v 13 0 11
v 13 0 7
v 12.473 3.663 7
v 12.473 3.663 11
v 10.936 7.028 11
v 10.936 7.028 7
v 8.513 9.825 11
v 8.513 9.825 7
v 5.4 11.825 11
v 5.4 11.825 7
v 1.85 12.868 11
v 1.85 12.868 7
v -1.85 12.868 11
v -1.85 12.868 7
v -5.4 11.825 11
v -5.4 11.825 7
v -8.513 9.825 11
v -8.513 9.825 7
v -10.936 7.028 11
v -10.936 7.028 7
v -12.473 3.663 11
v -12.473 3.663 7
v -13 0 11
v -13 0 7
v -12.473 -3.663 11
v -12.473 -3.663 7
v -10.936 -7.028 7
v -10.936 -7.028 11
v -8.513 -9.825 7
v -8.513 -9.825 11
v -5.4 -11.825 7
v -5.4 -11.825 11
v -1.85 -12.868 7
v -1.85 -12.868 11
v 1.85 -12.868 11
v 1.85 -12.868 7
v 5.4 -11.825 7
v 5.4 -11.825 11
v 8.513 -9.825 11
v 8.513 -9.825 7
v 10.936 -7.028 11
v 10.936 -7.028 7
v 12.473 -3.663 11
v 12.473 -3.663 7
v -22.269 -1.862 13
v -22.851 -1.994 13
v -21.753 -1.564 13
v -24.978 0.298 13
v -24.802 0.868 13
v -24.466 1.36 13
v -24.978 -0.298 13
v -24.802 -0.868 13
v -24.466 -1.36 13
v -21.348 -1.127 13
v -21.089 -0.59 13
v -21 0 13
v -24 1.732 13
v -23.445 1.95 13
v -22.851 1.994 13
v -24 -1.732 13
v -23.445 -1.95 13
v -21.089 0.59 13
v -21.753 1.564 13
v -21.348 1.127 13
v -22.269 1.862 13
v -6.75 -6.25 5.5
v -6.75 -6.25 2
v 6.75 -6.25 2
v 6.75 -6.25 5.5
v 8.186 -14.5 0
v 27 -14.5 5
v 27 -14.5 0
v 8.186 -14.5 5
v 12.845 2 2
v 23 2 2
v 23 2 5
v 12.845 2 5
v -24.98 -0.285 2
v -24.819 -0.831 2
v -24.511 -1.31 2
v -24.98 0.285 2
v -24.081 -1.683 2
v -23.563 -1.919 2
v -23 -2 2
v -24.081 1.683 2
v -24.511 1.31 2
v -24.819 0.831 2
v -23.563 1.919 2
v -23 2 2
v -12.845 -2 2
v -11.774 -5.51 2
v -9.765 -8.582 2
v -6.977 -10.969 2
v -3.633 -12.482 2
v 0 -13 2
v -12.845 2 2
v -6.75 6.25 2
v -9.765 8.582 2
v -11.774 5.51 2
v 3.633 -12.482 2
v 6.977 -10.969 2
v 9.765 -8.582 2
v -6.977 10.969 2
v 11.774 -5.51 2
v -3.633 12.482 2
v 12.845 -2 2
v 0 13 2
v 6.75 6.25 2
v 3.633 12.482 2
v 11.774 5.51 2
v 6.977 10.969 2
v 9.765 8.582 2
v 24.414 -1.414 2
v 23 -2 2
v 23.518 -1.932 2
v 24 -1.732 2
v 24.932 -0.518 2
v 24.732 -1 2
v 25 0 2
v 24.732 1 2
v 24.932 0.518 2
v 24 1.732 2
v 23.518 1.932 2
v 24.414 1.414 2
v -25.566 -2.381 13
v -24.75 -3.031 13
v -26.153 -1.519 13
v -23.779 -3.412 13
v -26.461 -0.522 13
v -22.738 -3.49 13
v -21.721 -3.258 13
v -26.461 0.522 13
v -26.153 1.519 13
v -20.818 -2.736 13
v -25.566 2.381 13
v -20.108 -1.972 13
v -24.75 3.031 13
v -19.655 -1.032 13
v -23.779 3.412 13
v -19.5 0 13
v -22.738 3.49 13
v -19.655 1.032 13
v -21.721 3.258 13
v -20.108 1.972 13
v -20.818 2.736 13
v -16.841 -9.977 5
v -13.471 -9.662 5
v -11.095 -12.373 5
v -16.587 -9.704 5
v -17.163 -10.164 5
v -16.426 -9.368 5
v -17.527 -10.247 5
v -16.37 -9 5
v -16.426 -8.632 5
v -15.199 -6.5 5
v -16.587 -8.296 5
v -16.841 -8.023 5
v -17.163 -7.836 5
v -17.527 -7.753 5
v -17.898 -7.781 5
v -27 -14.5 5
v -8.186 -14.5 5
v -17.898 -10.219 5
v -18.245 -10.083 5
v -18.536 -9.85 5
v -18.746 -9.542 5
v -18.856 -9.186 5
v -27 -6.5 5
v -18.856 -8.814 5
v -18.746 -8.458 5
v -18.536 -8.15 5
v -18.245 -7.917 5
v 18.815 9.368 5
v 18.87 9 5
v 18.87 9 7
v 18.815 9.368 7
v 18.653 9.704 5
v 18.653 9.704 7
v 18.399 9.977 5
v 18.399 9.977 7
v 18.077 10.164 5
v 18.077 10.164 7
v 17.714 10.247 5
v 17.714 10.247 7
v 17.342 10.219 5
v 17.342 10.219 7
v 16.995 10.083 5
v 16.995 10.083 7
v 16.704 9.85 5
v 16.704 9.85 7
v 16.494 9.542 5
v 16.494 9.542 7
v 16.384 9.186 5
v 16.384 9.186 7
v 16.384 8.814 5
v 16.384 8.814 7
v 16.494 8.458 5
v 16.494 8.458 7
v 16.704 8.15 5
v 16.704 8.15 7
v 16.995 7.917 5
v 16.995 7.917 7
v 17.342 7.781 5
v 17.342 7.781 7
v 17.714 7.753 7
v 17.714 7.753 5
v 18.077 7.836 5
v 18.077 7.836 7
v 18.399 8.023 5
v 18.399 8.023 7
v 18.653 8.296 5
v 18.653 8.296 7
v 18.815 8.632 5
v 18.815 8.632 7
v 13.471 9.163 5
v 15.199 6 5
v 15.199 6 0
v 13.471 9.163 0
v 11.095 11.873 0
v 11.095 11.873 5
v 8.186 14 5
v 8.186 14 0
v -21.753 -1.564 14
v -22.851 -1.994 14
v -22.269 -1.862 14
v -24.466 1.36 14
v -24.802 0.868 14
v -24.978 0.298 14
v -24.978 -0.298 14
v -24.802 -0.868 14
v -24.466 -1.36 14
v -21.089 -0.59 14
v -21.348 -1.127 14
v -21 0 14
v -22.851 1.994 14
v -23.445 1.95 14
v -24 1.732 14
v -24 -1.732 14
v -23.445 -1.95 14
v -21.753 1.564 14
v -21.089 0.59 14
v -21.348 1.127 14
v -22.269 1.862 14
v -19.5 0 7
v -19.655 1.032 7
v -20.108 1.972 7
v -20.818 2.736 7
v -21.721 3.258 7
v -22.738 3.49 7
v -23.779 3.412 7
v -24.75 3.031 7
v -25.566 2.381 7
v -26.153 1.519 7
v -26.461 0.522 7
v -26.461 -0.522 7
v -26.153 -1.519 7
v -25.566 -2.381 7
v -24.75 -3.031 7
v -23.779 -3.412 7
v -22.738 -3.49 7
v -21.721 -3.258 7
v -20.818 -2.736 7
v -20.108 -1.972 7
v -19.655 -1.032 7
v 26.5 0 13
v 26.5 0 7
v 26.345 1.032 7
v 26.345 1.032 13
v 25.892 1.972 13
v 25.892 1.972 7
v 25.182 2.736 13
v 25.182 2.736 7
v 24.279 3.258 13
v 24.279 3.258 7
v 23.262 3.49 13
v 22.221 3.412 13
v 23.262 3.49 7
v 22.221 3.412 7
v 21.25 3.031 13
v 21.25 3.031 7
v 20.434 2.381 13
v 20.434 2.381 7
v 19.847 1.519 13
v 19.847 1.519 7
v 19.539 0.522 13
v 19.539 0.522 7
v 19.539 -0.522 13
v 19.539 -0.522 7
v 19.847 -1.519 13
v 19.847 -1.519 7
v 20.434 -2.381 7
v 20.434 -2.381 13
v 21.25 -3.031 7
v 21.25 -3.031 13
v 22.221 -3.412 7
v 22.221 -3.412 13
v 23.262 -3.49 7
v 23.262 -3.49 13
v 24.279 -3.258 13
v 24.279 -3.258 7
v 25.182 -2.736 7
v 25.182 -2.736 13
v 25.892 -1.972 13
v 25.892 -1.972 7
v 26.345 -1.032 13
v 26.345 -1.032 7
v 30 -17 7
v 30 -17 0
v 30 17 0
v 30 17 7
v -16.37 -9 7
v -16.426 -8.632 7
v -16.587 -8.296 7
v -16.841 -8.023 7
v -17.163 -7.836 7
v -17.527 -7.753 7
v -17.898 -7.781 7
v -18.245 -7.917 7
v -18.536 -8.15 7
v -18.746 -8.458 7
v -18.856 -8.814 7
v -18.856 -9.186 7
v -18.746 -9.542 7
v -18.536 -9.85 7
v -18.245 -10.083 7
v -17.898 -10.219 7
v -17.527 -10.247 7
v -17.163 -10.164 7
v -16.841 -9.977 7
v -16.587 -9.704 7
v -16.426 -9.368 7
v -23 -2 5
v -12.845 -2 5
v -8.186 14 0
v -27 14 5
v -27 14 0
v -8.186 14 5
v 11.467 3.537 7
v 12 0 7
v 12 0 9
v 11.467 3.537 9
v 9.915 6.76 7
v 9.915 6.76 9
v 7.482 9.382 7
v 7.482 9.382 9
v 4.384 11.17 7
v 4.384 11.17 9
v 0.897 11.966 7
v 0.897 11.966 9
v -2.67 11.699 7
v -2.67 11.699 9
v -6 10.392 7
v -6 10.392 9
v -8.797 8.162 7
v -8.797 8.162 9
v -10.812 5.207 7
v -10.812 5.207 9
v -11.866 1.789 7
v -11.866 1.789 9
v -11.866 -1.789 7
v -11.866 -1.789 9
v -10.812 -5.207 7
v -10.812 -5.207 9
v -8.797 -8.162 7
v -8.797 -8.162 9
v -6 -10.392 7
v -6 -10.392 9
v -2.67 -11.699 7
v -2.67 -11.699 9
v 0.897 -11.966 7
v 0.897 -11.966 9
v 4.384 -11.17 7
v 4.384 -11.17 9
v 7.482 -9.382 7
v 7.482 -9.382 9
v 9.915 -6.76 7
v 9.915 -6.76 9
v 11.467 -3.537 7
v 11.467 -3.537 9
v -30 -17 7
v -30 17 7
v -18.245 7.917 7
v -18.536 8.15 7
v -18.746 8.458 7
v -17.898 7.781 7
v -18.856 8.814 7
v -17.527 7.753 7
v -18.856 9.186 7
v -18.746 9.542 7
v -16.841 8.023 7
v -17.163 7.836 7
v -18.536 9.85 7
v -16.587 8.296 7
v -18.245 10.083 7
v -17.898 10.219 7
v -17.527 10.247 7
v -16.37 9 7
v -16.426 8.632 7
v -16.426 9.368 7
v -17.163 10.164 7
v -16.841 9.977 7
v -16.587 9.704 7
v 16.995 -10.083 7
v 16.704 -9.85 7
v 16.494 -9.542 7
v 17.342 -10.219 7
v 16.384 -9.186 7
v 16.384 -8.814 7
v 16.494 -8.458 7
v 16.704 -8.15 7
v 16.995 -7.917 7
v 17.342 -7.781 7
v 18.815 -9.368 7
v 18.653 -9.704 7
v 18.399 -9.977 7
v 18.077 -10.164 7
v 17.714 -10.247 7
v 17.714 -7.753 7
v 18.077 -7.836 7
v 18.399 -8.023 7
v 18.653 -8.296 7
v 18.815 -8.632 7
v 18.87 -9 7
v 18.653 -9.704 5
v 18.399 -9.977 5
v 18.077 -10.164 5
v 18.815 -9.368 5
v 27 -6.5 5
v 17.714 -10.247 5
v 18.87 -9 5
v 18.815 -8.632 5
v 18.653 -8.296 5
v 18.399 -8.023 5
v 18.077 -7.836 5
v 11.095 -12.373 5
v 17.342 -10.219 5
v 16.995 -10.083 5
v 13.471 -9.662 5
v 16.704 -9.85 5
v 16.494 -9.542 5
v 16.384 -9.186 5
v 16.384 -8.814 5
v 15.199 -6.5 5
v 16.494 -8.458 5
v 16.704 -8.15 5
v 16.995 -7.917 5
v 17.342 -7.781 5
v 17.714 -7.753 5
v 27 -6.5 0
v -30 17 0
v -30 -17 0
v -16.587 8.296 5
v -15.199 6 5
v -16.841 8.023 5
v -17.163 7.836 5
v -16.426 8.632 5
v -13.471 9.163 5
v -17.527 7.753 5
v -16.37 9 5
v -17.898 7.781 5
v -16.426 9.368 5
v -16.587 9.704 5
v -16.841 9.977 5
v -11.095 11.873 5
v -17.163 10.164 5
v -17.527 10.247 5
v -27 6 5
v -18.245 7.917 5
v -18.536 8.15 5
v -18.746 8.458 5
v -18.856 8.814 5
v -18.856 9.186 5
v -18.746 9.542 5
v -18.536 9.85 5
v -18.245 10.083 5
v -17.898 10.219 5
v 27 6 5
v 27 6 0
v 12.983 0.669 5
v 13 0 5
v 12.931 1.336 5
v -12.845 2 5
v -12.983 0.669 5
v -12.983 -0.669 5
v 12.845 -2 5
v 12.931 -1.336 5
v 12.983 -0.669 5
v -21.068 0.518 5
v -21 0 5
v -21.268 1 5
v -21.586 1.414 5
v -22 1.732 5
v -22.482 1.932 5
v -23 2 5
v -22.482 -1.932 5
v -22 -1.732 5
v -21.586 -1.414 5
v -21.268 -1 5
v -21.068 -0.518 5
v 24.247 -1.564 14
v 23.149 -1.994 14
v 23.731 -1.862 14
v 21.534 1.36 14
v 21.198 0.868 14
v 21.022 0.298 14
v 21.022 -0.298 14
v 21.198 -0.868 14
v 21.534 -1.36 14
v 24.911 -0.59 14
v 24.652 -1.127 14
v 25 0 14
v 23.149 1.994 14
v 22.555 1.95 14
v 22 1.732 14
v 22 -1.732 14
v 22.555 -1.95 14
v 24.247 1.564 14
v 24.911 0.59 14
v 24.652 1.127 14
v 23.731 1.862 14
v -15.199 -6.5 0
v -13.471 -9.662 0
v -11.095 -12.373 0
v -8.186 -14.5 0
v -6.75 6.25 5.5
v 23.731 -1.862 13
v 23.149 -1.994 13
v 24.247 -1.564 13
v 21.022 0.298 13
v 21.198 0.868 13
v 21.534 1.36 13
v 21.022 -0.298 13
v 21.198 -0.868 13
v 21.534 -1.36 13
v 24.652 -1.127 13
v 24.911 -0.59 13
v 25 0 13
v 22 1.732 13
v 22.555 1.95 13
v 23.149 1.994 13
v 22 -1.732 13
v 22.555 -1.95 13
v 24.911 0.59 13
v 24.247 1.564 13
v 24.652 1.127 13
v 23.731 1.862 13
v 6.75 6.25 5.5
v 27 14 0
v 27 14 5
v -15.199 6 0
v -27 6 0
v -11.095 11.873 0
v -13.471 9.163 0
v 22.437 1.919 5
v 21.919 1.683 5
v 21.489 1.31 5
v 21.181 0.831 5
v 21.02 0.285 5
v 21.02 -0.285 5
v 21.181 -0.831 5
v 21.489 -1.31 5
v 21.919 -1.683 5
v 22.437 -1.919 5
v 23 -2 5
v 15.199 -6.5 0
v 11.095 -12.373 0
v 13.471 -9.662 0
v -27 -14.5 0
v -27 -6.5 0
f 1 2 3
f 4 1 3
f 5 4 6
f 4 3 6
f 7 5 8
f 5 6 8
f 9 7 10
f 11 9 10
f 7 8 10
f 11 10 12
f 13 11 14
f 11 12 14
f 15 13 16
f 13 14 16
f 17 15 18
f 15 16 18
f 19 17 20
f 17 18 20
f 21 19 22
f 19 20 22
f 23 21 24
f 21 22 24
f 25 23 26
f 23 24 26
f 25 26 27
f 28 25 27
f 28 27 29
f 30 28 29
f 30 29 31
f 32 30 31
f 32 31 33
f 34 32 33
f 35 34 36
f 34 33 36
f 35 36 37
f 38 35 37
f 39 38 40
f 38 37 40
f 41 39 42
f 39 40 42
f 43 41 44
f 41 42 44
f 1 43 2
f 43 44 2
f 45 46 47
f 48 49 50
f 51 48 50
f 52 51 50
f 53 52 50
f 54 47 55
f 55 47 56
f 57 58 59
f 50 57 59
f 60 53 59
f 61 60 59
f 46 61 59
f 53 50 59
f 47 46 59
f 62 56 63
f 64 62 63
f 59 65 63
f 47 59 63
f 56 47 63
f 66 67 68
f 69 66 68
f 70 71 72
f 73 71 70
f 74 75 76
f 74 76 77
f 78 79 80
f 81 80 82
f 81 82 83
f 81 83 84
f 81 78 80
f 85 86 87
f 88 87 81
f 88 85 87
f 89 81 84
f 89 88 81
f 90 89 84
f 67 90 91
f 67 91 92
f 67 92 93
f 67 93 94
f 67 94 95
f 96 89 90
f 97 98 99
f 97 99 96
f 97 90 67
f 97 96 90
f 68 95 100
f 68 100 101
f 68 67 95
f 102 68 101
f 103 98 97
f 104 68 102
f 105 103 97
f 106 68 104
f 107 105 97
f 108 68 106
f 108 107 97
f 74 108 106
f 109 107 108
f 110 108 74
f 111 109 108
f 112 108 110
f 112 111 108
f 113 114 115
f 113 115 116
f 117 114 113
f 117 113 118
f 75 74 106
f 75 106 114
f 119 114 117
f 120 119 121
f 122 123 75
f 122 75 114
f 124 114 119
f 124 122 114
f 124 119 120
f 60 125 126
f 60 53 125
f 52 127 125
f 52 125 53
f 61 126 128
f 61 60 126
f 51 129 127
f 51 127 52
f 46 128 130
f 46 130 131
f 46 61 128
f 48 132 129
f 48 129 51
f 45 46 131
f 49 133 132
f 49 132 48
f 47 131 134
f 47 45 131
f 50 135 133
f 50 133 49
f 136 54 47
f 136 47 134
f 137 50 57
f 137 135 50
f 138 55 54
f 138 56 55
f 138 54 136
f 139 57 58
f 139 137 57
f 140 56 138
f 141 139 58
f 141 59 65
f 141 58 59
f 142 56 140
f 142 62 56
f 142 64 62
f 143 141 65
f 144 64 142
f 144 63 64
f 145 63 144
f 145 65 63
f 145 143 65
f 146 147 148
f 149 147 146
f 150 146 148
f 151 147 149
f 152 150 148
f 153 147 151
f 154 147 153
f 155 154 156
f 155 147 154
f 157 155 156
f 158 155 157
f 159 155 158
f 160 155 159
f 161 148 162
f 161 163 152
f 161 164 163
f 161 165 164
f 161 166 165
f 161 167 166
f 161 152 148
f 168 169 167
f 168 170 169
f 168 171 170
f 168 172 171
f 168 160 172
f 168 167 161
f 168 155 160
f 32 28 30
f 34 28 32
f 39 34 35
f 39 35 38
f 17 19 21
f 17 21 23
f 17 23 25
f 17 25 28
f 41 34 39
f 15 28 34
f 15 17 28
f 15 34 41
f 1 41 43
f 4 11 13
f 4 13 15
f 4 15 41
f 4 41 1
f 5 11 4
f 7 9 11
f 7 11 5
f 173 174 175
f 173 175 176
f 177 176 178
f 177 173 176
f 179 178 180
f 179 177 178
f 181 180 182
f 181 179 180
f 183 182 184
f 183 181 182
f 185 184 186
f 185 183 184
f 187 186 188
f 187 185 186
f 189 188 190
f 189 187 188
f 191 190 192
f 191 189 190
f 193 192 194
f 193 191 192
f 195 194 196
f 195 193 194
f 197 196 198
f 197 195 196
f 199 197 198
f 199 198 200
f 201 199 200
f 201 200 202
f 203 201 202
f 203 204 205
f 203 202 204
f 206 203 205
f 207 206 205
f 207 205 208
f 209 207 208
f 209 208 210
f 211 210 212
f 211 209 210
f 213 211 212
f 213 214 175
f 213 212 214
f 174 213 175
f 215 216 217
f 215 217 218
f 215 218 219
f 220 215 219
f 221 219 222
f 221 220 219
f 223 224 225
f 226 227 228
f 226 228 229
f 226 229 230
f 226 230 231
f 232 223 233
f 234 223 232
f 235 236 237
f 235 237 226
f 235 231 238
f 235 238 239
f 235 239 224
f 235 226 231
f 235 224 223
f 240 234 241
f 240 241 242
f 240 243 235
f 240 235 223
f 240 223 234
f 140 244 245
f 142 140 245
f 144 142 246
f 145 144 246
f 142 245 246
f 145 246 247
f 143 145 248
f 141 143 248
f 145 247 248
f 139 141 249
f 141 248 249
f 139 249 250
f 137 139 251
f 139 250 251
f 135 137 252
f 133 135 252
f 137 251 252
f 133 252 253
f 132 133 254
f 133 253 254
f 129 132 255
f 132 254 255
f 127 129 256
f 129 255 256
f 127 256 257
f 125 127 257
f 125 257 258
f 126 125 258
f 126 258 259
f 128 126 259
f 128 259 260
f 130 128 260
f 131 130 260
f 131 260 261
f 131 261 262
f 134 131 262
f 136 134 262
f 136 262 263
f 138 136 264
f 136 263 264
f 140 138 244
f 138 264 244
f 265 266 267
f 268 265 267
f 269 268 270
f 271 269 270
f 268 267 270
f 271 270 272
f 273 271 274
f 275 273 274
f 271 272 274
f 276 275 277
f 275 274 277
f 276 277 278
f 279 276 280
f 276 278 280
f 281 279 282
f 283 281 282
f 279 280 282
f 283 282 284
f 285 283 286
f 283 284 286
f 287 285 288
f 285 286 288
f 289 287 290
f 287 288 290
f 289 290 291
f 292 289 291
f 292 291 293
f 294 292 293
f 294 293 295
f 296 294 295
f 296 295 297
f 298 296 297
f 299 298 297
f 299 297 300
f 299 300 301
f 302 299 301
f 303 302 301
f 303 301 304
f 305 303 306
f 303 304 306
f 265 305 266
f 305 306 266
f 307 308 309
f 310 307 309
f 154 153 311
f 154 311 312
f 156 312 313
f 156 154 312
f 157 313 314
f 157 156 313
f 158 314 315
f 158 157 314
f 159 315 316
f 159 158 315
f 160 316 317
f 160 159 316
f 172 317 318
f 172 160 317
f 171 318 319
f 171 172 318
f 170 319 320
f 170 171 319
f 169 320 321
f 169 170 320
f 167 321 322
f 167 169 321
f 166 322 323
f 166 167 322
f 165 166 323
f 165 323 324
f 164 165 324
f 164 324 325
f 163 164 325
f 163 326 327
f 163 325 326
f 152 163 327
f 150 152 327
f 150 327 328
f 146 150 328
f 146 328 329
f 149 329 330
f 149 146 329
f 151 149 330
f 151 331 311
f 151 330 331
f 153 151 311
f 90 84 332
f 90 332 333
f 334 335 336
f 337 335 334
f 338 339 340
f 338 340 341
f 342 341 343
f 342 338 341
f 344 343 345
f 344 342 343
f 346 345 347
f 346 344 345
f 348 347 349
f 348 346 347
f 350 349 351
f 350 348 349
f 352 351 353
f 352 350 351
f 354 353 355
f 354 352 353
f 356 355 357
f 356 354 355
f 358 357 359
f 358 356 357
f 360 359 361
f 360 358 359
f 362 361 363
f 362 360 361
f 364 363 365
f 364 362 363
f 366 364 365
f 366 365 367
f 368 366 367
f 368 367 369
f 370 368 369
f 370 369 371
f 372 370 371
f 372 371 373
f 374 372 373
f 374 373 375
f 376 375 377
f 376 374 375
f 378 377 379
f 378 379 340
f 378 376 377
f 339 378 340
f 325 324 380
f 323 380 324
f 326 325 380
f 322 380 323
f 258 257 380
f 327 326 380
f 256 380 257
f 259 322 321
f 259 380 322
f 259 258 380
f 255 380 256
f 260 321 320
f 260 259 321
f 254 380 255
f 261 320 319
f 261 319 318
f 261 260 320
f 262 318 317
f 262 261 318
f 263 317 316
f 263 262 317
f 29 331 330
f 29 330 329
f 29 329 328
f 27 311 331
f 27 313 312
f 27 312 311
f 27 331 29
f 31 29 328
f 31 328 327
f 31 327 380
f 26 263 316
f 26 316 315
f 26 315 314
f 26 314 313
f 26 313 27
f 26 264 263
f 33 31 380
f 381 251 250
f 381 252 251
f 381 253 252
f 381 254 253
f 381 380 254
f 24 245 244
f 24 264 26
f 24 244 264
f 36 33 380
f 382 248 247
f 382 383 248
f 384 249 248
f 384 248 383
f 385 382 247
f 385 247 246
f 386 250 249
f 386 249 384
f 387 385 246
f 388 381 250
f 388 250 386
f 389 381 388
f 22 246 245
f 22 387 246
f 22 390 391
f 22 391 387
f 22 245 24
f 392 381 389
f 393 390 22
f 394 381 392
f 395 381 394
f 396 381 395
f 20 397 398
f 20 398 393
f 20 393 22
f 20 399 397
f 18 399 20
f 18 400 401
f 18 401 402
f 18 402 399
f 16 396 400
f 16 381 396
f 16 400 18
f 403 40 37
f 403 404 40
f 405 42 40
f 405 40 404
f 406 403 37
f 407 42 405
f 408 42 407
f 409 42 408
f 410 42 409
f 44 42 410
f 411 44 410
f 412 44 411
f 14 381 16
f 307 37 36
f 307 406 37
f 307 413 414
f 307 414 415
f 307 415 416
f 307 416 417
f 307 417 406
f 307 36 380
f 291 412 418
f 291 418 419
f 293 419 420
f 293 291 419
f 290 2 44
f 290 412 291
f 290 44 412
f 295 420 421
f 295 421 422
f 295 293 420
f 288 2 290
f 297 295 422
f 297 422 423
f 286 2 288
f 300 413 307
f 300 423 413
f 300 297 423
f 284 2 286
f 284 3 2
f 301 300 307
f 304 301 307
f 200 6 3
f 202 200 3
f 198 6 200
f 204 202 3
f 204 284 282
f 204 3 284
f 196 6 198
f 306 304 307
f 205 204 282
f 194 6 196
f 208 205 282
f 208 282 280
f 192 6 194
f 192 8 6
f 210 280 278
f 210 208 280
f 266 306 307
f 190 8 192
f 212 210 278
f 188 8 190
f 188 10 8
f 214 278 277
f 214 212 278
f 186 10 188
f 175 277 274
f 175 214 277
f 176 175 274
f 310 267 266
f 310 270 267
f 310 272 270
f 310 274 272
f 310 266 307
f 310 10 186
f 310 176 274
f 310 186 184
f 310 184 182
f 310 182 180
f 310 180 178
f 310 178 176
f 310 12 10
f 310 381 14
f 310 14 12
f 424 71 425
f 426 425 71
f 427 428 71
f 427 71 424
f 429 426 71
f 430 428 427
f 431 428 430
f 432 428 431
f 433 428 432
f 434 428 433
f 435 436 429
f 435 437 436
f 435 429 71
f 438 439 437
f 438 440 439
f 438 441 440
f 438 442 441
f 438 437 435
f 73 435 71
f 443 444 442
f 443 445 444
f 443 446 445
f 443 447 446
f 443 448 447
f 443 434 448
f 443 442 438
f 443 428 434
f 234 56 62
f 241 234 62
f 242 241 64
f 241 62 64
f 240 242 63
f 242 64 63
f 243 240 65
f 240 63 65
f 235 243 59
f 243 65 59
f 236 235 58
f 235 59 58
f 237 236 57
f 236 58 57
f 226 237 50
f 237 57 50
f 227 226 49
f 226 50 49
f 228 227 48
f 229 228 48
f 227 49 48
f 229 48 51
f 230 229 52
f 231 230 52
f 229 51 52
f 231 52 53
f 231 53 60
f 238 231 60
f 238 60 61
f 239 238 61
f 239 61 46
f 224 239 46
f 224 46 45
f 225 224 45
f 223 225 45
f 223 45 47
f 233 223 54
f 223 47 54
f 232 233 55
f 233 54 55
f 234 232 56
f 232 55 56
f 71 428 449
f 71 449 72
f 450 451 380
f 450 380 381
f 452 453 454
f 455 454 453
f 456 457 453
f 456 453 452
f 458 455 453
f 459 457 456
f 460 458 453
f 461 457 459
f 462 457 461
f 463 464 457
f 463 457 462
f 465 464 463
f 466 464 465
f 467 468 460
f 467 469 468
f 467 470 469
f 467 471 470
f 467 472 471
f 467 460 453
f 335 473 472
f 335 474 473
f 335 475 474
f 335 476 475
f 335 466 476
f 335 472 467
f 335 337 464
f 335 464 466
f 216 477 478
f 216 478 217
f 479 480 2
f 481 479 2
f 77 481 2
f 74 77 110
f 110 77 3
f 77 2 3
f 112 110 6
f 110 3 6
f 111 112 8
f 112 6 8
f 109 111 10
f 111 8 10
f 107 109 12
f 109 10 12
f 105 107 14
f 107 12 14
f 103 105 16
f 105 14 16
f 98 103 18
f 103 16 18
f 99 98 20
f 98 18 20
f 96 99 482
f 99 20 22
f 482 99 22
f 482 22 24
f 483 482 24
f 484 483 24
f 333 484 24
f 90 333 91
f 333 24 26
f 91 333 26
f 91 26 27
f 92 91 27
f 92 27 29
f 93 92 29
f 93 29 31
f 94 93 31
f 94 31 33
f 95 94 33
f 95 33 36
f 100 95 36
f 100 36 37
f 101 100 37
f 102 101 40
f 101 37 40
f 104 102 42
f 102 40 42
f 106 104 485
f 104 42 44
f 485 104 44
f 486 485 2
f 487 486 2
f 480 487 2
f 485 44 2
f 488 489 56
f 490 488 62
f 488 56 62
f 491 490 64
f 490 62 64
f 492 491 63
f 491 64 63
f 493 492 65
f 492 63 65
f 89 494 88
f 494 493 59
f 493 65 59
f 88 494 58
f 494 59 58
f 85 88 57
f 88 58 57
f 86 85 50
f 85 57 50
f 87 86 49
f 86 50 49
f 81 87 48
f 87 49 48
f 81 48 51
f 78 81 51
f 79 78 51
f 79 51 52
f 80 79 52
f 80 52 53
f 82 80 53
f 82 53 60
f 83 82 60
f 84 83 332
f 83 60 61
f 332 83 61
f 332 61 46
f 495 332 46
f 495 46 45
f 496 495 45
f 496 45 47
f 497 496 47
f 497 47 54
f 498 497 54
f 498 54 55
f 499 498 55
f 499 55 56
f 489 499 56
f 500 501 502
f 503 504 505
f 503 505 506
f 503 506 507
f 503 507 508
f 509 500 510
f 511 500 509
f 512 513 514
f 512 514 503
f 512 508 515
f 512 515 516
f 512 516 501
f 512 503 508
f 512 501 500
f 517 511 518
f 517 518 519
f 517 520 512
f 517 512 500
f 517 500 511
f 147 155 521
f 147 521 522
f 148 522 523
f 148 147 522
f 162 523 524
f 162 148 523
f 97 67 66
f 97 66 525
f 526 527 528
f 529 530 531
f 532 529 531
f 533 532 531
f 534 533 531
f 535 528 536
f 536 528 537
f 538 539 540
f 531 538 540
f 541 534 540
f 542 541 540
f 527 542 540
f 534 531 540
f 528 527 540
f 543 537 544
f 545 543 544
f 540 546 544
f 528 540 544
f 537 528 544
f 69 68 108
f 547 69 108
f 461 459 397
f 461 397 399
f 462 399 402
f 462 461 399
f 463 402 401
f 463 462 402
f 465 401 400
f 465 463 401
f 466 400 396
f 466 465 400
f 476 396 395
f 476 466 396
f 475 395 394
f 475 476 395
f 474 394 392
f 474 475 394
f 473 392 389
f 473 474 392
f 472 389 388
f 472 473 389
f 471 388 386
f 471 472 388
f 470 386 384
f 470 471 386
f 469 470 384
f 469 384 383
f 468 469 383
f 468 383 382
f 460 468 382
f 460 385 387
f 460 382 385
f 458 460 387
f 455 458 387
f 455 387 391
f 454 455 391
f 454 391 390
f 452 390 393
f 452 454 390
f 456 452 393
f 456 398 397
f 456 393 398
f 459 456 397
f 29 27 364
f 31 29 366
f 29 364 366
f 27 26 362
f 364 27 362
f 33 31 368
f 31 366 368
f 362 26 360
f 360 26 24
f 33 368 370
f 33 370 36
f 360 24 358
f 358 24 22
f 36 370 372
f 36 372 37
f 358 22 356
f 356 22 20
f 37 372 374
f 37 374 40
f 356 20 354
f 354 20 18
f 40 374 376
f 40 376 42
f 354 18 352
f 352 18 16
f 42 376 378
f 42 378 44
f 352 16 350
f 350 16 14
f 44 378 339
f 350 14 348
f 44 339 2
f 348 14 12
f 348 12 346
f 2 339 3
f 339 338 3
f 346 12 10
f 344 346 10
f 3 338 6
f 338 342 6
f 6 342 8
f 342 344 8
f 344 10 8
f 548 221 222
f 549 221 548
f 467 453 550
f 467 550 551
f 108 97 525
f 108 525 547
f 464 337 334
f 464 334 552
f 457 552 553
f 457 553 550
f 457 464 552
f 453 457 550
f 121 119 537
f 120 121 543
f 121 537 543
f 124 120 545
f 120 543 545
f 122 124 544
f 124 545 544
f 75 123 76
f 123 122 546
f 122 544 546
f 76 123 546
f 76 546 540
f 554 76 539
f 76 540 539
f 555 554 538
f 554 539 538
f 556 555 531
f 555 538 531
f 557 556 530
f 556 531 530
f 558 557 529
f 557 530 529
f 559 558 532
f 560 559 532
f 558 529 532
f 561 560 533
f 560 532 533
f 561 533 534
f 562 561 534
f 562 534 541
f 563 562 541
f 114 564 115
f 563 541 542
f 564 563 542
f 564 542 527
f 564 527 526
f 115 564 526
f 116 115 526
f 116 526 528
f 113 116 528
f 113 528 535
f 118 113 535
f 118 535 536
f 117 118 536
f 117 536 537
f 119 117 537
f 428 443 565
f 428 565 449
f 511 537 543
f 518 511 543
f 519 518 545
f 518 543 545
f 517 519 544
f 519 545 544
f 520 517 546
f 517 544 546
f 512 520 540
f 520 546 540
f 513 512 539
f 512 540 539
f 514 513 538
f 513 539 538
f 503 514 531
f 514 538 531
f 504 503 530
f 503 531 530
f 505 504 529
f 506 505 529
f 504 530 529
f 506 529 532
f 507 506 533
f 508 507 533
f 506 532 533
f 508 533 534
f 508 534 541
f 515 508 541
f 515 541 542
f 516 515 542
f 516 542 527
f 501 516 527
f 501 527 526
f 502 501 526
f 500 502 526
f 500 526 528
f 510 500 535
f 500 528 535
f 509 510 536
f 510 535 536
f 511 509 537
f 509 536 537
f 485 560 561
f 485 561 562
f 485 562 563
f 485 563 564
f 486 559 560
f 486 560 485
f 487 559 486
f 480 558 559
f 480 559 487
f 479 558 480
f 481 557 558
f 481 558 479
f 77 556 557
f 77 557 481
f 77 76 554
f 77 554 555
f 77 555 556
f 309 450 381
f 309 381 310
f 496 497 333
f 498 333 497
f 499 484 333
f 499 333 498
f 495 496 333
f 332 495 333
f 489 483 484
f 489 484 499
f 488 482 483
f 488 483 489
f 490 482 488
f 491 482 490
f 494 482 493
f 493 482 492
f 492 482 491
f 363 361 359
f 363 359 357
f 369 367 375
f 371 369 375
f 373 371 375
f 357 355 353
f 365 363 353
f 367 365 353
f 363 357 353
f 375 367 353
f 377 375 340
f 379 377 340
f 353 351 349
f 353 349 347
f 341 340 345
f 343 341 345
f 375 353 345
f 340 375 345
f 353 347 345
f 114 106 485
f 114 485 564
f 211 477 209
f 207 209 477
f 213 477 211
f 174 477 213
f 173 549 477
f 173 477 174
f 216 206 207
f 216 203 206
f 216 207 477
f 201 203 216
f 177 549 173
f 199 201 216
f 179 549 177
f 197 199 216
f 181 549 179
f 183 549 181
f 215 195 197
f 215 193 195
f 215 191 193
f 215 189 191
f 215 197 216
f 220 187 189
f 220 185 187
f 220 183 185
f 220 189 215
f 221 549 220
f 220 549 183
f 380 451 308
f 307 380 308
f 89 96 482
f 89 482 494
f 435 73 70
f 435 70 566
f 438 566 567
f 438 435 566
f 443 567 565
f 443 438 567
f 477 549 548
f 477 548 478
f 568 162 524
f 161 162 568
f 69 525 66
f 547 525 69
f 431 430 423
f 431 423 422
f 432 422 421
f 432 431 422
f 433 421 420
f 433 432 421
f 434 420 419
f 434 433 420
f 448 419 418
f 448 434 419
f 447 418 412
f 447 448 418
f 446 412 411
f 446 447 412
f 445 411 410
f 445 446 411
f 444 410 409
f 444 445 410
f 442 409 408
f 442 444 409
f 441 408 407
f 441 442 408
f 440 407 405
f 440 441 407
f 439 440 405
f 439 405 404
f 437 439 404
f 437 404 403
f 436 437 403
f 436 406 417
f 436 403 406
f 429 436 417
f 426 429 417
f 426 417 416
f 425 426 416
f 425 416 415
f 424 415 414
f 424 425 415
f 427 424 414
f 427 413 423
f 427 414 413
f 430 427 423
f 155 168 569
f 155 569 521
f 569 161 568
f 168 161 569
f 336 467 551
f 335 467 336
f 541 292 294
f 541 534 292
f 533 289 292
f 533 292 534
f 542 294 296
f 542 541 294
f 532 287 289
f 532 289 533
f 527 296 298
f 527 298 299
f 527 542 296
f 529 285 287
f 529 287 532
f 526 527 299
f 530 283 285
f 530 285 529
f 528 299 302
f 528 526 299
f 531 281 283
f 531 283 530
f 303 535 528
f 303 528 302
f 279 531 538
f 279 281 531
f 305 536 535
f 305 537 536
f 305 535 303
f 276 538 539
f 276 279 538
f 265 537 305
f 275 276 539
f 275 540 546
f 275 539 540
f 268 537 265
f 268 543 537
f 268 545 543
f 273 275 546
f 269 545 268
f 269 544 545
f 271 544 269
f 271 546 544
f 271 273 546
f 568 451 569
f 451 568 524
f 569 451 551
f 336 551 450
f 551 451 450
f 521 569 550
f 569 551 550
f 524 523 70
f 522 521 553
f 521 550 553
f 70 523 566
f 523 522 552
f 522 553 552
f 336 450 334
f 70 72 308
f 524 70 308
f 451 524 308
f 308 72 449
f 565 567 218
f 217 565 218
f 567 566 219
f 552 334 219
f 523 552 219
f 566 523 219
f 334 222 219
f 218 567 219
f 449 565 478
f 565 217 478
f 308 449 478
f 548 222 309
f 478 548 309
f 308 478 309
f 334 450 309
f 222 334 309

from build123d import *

# Parameters (mm, degrees)
SKETCH1_W                = 60
SKETCH1_H                = 34
BOSS_EXTRUDE1_DEPTH      = 7
SKETCH6_R                = 2
SKETCH6_R_2              = 13
CUT_EXTRUDE4_DEPTH       = 5
CUT_EXTRUDE6_DEPTH       = 3
SKETCH10_R               = 3.5
BOSS_EXTRUDE5_DEPTH      = 6
SKETCH11_R               = 2
CUT_EXTRUDE7_DEPTH       = 7
CUT_EXTRUDE8_START       = -5
CUT_EXTRUDE8_DEPTH       = 5
CUT_EXTRUDE9_DEPTH       = 36.185224172
CUT_EXTRUDE9_DEPTH_BACK  = 36.185224172
SKETCH13_R               = 1.25
CUT_EXTRUDE10_DEPTH      = 36.185224172
CUT_EXTRUDE10_DEPTH_BACK = 36.185224172
SKETCH14_R               = 1.25
CUT_EXTRUDE11_DEPTH      = 36.185224172
CUT_EXTRUDE11_DEPTH_BACK = 36.185224172
SKETCH15_R               = 1.25
CUT_EXTRUDE12_DEPTH      = 36.185224172
CUT_EXTRUDE12_DEPTH_BACK = 36.185224172
SKETCH16_R               = 1.25
SKETCH17_R               = 2
BOSS_EXTRUDE6_DEPTH      = 1
BOSS_EXTRUDE6_2_DEPTH    = 1
SKETCH18_R               = 13
BOSS_EXTRUDE7_DEPTH      = 4
SKETCH19_R               = 12
CUT_EXTRUDE13_DEPTH      = 2
SKETCH20_W               = 13.5
SKETCH20_H               = 12.5
BOSS_EXTRUDE8_DEPTH      = 3.5


# Read off the part's stored shape, not the designer's step: Cut-Extrude8
with BuildPart() as part:
    # Sketch1 → Boss-Extrude1 (new body)
    with BuildSketch(Plane.XY):
        Rectangle(SKETCH1_W, SKETCH1_H)
    extrude(amount=BOSS_EXTRUDE1_DEPTH)

    # Sketch6 → Cut-Extrude4 (cut)
    with BuildSketch(Plane.XY.offset(7)):
        with Locations((-23, 0)):
            Circle(SKETCH6_R)
        with Locations((23, 0)):
            Circle(SKETCH6_R)
        Circle(SKETCH6_R_2)
    extrude(amount=-CUT_EXTRUDE4_DEPTH, mode=Mode.SUBTRACT)

    # Sketch9 → Cut-Extrude6 (cut)
    with BuildSketch(Plane.XY.offset(2)):
        Polygon((-21.845232579, 2), (-12.845232579, 2), (12.845232579, 2), (21.845232579, 2), (23, 2), (23, 0), (23, -2), (21.845232579, -2), (12.845232579, -2), (-12.845232579, -2), (-21.845232579, -2), (-23, -2), (-23, 0), (-23, 2), align=None)
    extrude(amount=CUT_EXTRUDE6_DEPTH, mode=Mode.SUBTRACT)

    # Sketch10 → Boss-Extrude5 (add)
    with BuildSketch(Plane.XY.offset(7)):
        with Locations((23, 0)):
            Circle(SKETCH10_R)
        with Locations((-23, 0)):
            Circle(SKETCH10_R)
    extrude(amount=BOSS_EXTRUDE5_DEPTH)

    # Sketch11 → Cut-Extrude7 (cut)
    with BuildSketch(Plane.XY.offset(13)):
        with Locations((-23, 0)):
            Circle(SKETCH11_R)
        with Locations((23, 0)):
            Circle(SKETCH11_R)
    extrude(amount=-CUT_EXTRUDE7_DEPTH, mode=Mode.SUBTRACT)

    # Cut-Extrude8 outline → Cut-Extrude8 (cut)
    with BuildSketch(Plane(origin=(0, 0, 0), x_dir=(-1, 0, 0), z_dir=(0, 0, -1)).offset(CUT_EXTRUDE8_START)):
        with BuildLine():
            Line((-8.185521436, 14), (-27, 14))
            Line((-27, 14), (-27, 6))
            Line((-27, 6), (-15.198684154, 6))
            ThreePointArc((-15.198684154, 6), (-12.357397289, 10.583227318), (-8.185521436, 14))
        make_face()
        with BuildLine():
            Line((-15.198684154, -6.499654852), (-27, -6.499654852))
            Line((-27, -6.499654852), (-27, -14.499654852))
            Line((-27, -14.499654852), (-8.185521436, -14.499654852))
            ThreePointArc((-8.185521436, -14.499654852), (-12.357397289, -11.08288217), (-15.198684154, -6.499654852))
        make_face()
        with BuildLine():
            Line((27, 6), (27, 14))
            Line((27, 14), (8.185521436, 14))
            ThreePointArc((8.185521436, 14), (12.357397289, 10.583227318), (15.198684154, 6))
            Line((15.198684154, 6), (27, 6))
        make_face()
        with BuildLine():
            ThreePointArc((15.198684154, -6.499654852), (12.357397289, -11.08288217), (8.185521436, -14.499654852))
            Line((8.185521436, -14.499654852), (27, -14.499654852))
            Line((27, -14.499654852), (27, -6.499654852))
            Line((27, -6.499654852), (15.198684154, -6.499654852))
        make_face()
    extrude(amount=CUT_EXTRUDE8_DEPTH, mode=Mode.SUBTRACT)

    # Sketch13 → Cut-Extrude9 (cut, two sides: drawn at the far end of the back side and taken through both)
    with BuildSketch(Plane.XY.offset(7).offset(-CUT_EXTRUDE9_DEPTH_BACK)):
        with Locations((17.620120435, -9)):
            Circle(SKETCH13_R)
    extrude(amount=CUT_EXTRUDE9_DEPTH + CUT_EXTRUDE9_DEPTH_BACK, mode=Mode.SUBTRACT)

    # Sketch14 → Cut-Extrude10 (cut, two sides: drawn at the far end of the back side and taken through both)
    with BuildSketch(Plane.XY.offset(7).offset(-CUT_EXTRUDE10_DEPTH_BACK)):
        with Locations((17.620120435, 9)):
            Circle(SKETCH14_R)
    extrude(amount=CUT_EXTRUDE10_DEPTH + CUT_EXTRUDE10_DEPTH_BACK, mode=Mode.SUBTRACT)

    # Sketch15 → Cut-Extrude11 (cut, two sides: drawn at the far end of the back side and taken through both)
    with BuildSketch(Plane.XY.offset(7).offset(-CUT_EXTRUDE11_DEPTH_BACK)):
        with Locations((-17.620120435, -9)):
            Circle(SKETCH15_R)
    extrude(amount=CUT_EXTRUDE11_DEPTH + CUT_EXTRUDE11_DEPTH_BACK, mode=Mode.SUBTRACT)

    # Sketch16 → Cut-Extrude12 (cut, two sides: drawn at the far end of the back side and taken through both)
    with BuildSketch(Plane.XY.offset(7).offset(-CUT_EXTRUDE12_DEPTH_BACK)):
        with Locations((-17.620120435, 9)):
            Circle(SKETCH16_R)
    extrude(amount=CUT_EXTRUDE12_DEPTH + CUT_EXTRUDE12_DEPTH_BACK, mode=Mode.SUBTRACT)

    # Sketch20 → Boss-Extrude8 (add)
    with BuildSketch(Plane.XY.offset(2)):
        Rectangle(SKETCH20_W, SKETCH20_H)
    extrude(amount=BOSS_EXTRUDE8_DEPTH)


with BuildPart() as body_2:
    # Sketch17 → Boss-Extrude6 (new body)
    with BuildSketch(Plane.XY.offset(13)):
        with Locations((-23, 0)):
            Circle(SKETCH17_R)
    extrude(amount=BOSS_EXTRUDE6_DEPTH)


with BuildPart() as body_3:
    # Sketch17 → Boss-Extrude6 2 (new body)
    with BuildSketch(Plane.XY.offset(13)):
        with Locations((23, 0)):
            Circle(SKETCH17_R)
    extrude(amount=BOSS_EXTRUDE6_2_DEPTH)


with BuildPart() as body_4:
    # Sketch18 → Boss-Extrude7 (new body)
    with BuildSketch(Plane.XY.offset(7)):
        Circle(SKETCH18_R)
    extrude(amount=BOSS_EXTRUDE7_DEPTH)

    # Sketch19 → Cut-Extrude13 (cut)
    with BuildSketch(Plane.XY.offset(7)):
        Circle(SKETCH19_R)
    extrude(amount=CUT_EXTRUDE13_DEPTH, mode=Mode.SUBTRACT)


solid = Compound([part.part, body_2.part, body_3.part, body_4.part])
